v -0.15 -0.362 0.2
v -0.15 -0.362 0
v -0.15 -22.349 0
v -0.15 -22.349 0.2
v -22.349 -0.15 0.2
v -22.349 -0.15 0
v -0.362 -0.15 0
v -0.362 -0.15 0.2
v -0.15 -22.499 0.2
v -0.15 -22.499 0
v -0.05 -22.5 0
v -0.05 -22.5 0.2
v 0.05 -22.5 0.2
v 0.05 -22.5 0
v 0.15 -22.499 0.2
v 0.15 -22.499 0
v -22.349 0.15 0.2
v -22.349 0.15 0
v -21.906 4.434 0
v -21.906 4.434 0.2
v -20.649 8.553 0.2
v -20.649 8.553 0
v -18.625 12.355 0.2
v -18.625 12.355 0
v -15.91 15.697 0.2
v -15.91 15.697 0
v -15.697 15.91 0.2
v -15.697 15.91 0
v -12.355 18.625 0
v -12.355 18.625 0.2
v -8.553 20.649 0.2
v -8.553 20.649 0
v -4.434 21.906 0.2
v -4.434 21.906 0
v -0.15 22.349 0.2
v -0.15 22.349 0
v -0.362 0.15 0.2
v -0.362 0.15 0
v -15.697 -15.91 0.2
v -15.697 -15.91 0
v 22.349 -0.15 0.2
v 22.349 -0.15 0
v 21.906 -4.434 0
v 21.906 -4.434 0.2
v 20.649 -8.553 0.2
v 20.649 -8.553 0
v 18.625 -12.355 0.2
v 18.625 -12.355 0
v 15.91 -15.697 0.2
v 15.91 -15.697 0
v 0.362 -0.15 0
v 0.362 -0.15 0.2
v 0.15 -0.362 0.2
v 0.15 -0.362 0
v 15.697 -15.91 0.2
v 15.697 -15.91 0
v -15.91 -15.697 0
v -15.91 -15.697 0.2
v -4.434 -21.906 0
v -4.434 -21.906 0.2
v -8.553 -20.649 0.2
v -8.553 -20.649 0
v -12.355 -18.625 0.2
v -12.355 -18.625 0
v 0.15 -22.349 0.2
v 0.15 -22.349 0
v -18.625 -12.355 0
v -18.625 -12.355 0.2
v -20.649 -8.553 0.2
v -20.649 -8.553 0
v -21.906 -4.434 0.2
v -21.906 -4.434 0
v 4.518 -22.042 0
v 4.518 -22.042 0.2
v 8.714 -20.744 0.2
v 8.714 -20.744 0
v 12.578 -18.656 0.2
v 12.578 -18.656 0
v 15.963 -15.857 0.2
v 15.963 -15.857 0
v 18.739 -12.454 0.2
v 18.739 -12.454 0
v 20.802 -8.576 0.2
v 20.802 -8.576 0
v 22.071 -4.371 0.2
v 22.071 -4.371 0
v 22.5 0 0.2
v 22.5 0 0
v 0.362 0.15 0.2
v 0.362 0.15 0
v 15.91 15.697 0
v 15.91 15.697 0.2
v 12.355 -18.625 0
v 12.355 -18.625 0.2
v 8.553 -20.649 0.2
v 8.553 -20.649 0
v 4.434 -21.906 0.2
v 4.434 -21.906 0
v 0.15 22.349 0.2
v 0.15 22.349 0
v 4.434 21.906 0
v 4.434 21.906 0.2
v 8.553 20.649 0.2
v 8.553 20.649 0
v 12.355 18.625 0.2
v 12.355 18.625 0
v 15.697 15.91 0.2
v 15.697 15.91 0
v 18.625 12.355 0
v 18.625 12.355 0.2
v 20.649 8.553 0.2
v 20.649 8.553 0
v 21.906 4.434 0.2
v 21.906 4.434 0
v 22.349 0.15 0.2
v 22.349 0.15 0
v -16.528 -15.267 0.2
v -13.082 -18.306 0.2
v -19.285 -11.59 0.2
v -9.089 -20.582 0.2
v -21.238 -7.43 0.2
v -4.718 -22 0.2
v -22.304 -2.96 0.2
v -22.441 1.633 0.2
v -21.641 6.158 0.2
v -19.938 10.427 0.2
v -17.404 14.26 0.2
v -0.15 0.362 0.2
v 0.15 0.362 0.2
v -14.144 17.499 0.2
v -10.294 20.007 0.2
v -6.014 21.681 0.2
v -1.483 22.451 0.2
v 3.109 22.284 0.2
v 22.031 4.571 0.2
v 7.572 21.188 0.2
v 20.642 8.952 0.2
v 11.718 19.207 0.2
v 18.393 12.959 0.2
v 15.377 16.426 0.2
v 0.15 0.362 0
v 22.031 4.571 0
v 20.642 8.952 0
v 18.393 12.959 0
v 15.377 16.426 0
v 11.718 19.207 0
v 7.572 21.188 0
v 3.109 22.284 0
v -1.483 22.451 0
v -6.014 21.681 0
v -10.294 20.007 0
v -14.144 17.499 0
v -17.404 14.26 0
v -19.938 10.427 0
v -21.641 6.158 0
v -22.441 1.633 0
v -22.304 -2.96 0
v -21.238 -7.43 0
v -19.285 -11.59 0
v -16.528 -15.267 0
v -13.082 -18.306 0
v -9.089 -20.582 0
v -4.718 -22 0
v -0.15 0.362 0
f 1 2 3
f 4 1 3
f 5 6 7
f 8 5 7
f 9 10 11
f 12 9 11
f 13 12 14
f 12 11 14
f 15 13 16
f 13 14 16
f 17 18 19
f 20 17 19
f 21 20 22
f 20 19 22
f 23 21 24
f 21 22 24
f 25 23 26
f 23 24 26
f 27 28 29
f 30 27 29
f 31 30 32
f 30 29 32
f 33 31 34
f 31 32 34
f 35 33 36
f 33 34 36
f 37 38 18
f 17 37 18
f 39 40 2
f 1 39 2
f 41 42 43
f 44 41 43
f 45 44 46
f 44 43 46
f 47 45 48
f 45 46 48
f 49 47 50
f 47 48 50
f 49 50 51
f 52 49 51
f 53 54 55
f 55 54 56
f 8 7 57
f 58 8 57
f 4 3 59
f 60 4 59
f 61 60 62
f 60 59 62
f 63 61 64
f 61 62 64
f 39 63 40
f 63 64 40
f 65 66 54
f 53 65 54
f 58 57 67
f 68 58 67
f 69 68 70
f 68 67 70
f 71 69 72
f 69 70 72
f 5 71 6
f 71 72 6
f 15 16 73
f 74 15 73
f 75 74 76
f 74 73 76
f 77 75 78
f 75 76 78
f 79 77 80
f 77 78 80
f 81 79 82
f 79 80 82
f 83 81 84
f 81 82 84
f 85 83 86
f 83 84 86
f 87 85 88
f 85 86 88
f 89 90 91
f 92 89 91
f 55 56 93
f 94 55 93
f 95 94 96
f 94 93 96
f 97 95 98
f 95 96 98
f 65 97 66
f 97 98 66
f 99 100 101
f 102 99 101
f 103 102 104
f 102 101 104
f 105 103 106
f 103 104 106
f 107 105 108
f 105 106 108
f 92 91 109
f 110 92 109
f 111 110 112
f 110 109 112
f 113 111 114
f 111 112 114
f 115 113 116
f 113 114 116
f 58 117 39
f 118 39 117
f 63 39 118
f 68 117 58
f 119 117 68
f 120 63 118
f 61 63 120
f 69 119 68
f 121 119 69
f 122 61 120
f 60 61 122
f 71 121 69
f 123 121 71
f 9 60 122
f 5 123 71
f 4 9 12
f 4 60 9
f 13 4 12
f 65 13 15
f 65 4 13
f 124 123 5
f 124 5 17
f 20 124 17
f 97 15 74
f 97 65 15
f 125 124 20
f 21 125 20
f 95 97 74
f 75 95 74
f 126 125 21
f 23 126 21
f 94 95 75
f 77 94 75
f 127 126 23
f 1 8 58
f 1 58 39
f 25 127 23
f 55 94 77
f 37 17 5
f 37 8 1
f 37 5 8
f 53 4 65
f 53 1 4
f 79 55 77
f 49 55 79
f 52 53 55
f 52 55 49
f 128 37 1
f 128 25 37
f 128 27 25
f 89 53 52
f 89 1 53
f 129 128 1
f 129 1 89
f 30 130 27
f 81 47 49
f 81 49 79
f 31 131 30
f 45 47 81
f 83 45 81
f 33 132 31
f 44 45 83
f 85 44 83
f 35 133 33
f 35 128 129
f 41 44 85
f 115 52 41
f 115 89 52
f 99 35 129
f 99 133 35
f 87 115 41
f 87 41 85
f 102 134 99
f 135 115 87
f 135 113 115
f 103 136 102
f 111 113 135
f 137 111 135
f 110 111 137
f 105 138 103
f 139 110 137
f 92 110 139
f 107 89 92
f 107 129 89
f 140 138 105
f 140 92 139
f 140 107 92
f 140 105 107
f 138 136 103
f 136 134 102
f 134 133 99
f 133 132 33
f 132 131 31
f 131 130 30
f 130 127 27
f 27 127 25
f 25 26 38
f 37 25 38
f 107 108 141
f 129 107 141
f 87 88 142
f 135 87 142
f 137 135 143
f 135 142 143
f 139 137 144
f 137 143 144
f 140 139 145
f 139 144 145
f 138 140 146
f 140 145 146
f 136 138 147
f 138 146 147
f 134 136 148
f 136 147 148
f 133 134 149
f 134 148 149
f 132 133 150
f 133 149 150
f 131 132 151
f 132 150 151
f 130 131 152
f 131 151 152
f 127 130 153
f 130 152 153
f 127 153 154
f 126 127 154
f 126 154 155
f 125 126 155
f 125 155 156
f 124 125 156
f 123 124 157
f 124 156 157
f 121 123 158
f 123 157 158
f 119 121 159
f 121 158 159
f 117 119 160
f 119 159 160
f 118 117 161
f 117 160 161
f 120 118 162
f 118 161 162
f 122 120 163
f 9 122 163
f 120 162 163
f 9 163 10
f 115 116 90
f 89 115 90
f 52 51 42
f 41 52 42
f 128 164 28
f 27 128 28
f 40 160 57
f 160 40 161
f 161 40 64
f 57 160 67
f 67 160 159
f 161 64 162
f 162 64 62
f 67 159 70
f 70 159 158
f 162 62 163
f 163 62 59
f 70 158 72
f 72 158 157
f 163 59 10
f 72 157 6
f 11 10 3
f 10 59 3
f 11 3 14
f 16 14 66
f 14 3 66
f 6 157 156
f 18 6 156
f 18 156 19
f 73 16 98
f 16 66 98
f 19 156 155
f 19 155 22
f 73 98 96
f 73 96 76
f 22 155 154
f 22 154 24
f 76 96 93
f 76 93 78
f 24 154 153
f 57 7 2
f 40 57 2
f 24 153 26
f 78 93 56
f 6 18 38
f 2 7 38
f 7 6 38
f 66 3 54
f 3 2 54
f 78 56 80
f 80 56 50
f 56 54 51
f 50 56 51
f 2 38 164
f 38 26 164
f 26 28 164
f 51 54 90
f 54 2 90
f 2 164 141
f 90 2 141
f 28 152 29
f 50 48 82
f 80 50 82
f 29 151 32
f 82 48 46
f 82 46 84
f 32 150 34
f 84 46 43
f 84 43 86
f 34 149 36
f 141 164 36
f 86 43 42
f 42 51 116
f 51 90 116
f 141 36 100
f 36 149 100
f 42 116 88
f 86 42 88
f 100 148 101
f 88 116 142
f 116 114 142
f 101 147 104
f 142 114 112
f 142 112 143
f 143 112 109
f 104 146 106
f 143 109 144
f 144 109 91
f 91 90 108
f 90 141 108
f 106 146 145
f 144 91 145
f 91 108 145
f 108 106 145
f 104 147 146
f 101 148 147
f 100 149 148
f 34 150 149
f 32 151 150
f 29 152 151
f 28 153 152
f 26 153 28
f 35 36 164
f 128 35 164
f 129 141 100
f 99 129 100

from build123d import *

# Parameters (mm, degrees)
F1_DEPTH = 0.2


with BuildPart() as f1:
    # F0 (on Top) → F1 (new body)
    with BuildSketch(Plane.XY):
        Polygon((-0.15, -0.0621320344), (-0.0621320344, -0.15), (0, -0.15), (0.0621320344, -0.15), (0.15, -0.0621320344), (0.15, 0), (0.15, 0.0621320344), (0.0621320344, 0.15), (0, 0.15), (-0.0621320344, 0.15), (-0.15, 0.0621320344), (-0.15, 0), align=None)
        Polygon((0, 0.2121320344), (-0.0621320344, 0.15), (0, 0.15), (0.0621320344, 0.15), align=None)
        Polygon((0.15, 0), (0.15, -0.0621320344), (0.2121320344, 0), (0.15, 0.0621320344), align=None)
        Polygon((0.0621320344, -0.15), (0.15, -0.15), (0.15, -0.0621320344), align=None)
        Polygon((0.0621320344, 0.15), (0.15, 0.0621320344), (0.15, 0.15), align=None)
        Polygon((0.15, 0.0621320344), (0.2121320344, 0), (0.3621320344, 0.15), (0.15, 0.15), align=None)
        Polygon((0, 0.2121320344), (0.0621320344, 0.15), (0.15, 0.15), (0.15, 0.3621320344), align=None)
        Polygon((0.15, -0.0621320344), (0.15, -0.15), (0.3621320344, -0.15), (0.2121320344, 0), align=None)
        with BuildLine():
            Line((0.3621320344, -0.15), (22.3494966386, -0.15))
            ThreePointArc((22.3494966386, -0.15), (22.3498741593, -0.0750004223), (22.35, 0))
            ThreePointArc((22.35, 0), (22.3498741593, 0.0750004223), (22.3494966386, 0.15))
            Line((22.3494966386, 0.15), (0.3621320344, 0.15))
            Line((0.3621320344, 0.15), (0.2121320344, 0))
            Line((0.2121320344, 0), (0.3621320344, -0.15))
        make_face()
        with BuildLine():
            Line((0.15, 0.15), (0.3621320344, 0.15))
            Line((0.3621320344, 0.15), (15.9095466465, 15.6974146121))
            ThreePointArc((15.9095466465, 15.6974146121), (15.8038365595, 15.8038365595), (15.6974146121, 15.9095466465))
            Line((15.6974146121, 15.9095466465), (0.15, 0.3621320344))
            Line((0.15, 0.3621320344), (0.15, 0.15))
        make_face()
        with BuildLine():
            ThreePointArc((0.15, 22.3494966386), (0, 22.35), (-0.15, 22.3494966386))
            Line((-0.15, 22.3494966386), (-0.15, 0.3621320344))
            Line((-0.15, 0.3621320344), (0, 0.2121320344))
            Line((0, 0.2121320344), (0.15, 0.3621320344))
            Line((0.15, 0.3621320344), (0.15, 22.3494966386))
        make_face()
        Polygon((0, -0.2121320344), (0.15, -0.3621320344), (0.15, -0.15), (0.0621320344, -0.15), align=None)
        with BuildLine():
            Line((0.15, -0.3621320344), (15.6974146121, -15.9095466465))
            ThreePointArc((15.6974146121, -15.9095466465), (15.8038365595, -15.8038365595), (15.9095466465, -15.6974146121))
            Line((15.9095466465, -15.6974146121), (0.3621320344, -0.15))
            Line((0.3621320344, -0.15), (0.15, -0.15))
            Line((0.15, -0.15), (0.15, -0.3621320344))
        make_face()
        Polygon((-0.0621320344, -0.15), (0, -0.2121320344), (0.0621320344, -0.15), (0, -0.15), align=None)
        Polygon((-0.15, -0.15), (-0.15, -0.3621320344), (0, -0.2121320344), (-0.0621320344, -0.15), align=None)
        Polygon((-0.15, -0.0621320344), (-0.15, -0.15), (-0.0621320344, -0.15), align=None)
        Polygon((-0.2121320344, 0), (-0.15, -0.0621320344), (-0.15, 0), (-0.15, 0.0621320344), align=None)
        Polygon((-0.15, 0.3621320344), (-0.15, 0.15), (-0.0621320344, 0.15), (0, 0.2121320344), align=None)
        Polygon((-0.15, 0.15), (-0.15, 0.0621320344), (-0.0621320344, 0.15), align=None)
        Polygon((-0.3621320344, 0.15), (-0.2121320344, 0), (-0.15, 0.0621320344), (-0.15, 0.15), align=None)
        with BuildLine():
            ThreePointArc((-15.6974146121, 15.9095466465), (-15.8038365595, 15.8038365595), (-15.9095466465, 15.6974146121))
            Line((-15.9095466465, 15.6974146121), (-0.3621320344, 0.15))
            Line((-0.3621320344, 0.15), (-0.15, 0.15))
            Line((-0.15, 0.15), (-0.15, 0.3621320344))
            Line((-0.15, 0.3621320344), (-15.6974146121, 15.9095466465))
        make_face()
        with BuildLine():
            ThreePointArc((-22.3494966386, 0.15), (-22.35, 0), (-22.3494966386, -0.15))
            Line((-22.3494966386, -0.15), (-0.3621320344, -0.15))
            Line((-0.3621320344, -0.15), (-0.2121320344, 0))
            Line((-0.2121320344, 0), (-0.3621320344, 0.15))
            Line((-0.3621320344, 0.15), (-22.3494966386, 0.15))
        make_face()
        Polygon((-0.3621320344, -0.15), (-0.15, -0.15), (-0.15, -0.0621320344), (-0.2121320344, 0), align=None)
        with BuildLine():
            ThreePointArc((-15.9095466465, -15.6974146121), (-15.8038365595, -15.8038365595), (-15.6974146121, -15.9095466465))
            Line((-15.6974146121, -15.9095466465), (-0.15, -0.3621320344))
            Line((-0.15, -0.3621320344), (-0.15, -0.15))
            Line((-0.15, -0.15), (-0.3621320344, -0.15))
            Line((-0.3621320344, -0.15), (-15.9095466465, -15.6974146121))
        make_face()
        with BuildLine():
            Line((-0.15, -0.3621320344), (-0.15, -22.3494966386))
            ThreePointArc((-0.15, -22.3494966386), (0, -22.35), (0.15, -22.3494966386))
            Line((0.15, -22.3494966386), (0.15, -0.3621320344))
            Line((0.15, -0.3621320344), (0, -0.2121320344))
            Line((0, -0.2121320344), (-0.15, -0.3621320344))
        make_face()
        with BuildLine():
            Line((-0.15, -22.3494966386), (-0.15, -22.4994999944))
            ThreePointArc((-0.15, -22.4994999944), (0, -22.5), (0.15, -22.4994999944))
            Line((0.15, -22.4994999944), (0.15, -22.3494966386))
            ThreePointArc((0.15, -22.3494966386), (0, -22.35), (-0.15, -22.3494966386))
        make_face()
        with BuildLine():
            ThreePointArc((0.15, -22.4994999944), (15.9628474903, -15.8567808839), (22.5, 0))
            ThreePointArc((22.5, 0), (-15.8567808839, 15.9628474903), (-0.15, -22.4994999944))
            Line((-0.15, -22.4994999944), (-0.15, -22.3494966386))
            ThreePointArc((-0.15, -22.3494966386), (-8.5529747134, -20.6487075516), (-15.6974146121, -15.9095466465))
            ThreePointArc((-15.6974146121, -15.9095466465), (-15.8038365595, -15.8038365595), (-15.9095466465, -15.6974146121))
            ThreePointArc((-15.9095466465, -15.6974146121), (-20.6487075516, -8.5529747134), (-22.3494966386, -0.15))
            ThreePointArc((-22.3494966386, -0.15), (-22.35, 0), (-22.3494966386, 0.15))
            ThreePointArc((-22.3494966386, 0.15), (-20.6487075516, 8.5529747134), (-15.9095466465, 15.6974146121))
            ThreePointArc((-15.9095466465, 15.6974146121), (-15.8038365595, 15.8038365595), (-15.6974146121, 15.9095466465))
            ThreePointArc((-15.6974146121, 15.9095466465), (-8.5529747134, 20.6487075516), (-0.15, 22.3494966386))
            ThreePointArc((-0.15, 22.3494966386), (0, 22.35), (0.15, 22.3494966386))
            ThreePointArc((0.15, 22.3494966386), (8.5529747134, 20.6487075516), (15.6974146121, 15.9095466465))
            ThreePointArc((15.6974146121, 15.9095466465), (15.8038365595, 15.8038365595), (15.9095466465, 15.6974146121))
            ThreePointArc((15.9095466465, 15.6974146121), (20.6487075516, 8.5529747134), (22.3494966386, 0.15))
            ThreePointArc((22.3494966386, 0.15), (22.3498741593, 0.0750004223), (22.35, 0))
            ThreePointArc((22.35, 0), (22.3498741593, -0.0750004223), (22.3494966386, -0.15))
            ThreePointArc((22.3494966386, -0.15), (20.6487075516, -8.5529747134), (15.9095466465, -15.6974146121))
            ThreePointArc((15.9095466465, -15.6974146121), (15.8038365595, -15.8038365595), (15.6974146121, -15.9095466465))
            ThreePointArc((15.6974146121, -15.9095466465), (8.5529747134, -20.6487075516), (0.15, -22.3494966386))
            Line((0.15, -22.3494966386), (0.15, -22.4994999944))
        make_face()
    extrude(amount=F1_DEPTH)


solid = f1.part
